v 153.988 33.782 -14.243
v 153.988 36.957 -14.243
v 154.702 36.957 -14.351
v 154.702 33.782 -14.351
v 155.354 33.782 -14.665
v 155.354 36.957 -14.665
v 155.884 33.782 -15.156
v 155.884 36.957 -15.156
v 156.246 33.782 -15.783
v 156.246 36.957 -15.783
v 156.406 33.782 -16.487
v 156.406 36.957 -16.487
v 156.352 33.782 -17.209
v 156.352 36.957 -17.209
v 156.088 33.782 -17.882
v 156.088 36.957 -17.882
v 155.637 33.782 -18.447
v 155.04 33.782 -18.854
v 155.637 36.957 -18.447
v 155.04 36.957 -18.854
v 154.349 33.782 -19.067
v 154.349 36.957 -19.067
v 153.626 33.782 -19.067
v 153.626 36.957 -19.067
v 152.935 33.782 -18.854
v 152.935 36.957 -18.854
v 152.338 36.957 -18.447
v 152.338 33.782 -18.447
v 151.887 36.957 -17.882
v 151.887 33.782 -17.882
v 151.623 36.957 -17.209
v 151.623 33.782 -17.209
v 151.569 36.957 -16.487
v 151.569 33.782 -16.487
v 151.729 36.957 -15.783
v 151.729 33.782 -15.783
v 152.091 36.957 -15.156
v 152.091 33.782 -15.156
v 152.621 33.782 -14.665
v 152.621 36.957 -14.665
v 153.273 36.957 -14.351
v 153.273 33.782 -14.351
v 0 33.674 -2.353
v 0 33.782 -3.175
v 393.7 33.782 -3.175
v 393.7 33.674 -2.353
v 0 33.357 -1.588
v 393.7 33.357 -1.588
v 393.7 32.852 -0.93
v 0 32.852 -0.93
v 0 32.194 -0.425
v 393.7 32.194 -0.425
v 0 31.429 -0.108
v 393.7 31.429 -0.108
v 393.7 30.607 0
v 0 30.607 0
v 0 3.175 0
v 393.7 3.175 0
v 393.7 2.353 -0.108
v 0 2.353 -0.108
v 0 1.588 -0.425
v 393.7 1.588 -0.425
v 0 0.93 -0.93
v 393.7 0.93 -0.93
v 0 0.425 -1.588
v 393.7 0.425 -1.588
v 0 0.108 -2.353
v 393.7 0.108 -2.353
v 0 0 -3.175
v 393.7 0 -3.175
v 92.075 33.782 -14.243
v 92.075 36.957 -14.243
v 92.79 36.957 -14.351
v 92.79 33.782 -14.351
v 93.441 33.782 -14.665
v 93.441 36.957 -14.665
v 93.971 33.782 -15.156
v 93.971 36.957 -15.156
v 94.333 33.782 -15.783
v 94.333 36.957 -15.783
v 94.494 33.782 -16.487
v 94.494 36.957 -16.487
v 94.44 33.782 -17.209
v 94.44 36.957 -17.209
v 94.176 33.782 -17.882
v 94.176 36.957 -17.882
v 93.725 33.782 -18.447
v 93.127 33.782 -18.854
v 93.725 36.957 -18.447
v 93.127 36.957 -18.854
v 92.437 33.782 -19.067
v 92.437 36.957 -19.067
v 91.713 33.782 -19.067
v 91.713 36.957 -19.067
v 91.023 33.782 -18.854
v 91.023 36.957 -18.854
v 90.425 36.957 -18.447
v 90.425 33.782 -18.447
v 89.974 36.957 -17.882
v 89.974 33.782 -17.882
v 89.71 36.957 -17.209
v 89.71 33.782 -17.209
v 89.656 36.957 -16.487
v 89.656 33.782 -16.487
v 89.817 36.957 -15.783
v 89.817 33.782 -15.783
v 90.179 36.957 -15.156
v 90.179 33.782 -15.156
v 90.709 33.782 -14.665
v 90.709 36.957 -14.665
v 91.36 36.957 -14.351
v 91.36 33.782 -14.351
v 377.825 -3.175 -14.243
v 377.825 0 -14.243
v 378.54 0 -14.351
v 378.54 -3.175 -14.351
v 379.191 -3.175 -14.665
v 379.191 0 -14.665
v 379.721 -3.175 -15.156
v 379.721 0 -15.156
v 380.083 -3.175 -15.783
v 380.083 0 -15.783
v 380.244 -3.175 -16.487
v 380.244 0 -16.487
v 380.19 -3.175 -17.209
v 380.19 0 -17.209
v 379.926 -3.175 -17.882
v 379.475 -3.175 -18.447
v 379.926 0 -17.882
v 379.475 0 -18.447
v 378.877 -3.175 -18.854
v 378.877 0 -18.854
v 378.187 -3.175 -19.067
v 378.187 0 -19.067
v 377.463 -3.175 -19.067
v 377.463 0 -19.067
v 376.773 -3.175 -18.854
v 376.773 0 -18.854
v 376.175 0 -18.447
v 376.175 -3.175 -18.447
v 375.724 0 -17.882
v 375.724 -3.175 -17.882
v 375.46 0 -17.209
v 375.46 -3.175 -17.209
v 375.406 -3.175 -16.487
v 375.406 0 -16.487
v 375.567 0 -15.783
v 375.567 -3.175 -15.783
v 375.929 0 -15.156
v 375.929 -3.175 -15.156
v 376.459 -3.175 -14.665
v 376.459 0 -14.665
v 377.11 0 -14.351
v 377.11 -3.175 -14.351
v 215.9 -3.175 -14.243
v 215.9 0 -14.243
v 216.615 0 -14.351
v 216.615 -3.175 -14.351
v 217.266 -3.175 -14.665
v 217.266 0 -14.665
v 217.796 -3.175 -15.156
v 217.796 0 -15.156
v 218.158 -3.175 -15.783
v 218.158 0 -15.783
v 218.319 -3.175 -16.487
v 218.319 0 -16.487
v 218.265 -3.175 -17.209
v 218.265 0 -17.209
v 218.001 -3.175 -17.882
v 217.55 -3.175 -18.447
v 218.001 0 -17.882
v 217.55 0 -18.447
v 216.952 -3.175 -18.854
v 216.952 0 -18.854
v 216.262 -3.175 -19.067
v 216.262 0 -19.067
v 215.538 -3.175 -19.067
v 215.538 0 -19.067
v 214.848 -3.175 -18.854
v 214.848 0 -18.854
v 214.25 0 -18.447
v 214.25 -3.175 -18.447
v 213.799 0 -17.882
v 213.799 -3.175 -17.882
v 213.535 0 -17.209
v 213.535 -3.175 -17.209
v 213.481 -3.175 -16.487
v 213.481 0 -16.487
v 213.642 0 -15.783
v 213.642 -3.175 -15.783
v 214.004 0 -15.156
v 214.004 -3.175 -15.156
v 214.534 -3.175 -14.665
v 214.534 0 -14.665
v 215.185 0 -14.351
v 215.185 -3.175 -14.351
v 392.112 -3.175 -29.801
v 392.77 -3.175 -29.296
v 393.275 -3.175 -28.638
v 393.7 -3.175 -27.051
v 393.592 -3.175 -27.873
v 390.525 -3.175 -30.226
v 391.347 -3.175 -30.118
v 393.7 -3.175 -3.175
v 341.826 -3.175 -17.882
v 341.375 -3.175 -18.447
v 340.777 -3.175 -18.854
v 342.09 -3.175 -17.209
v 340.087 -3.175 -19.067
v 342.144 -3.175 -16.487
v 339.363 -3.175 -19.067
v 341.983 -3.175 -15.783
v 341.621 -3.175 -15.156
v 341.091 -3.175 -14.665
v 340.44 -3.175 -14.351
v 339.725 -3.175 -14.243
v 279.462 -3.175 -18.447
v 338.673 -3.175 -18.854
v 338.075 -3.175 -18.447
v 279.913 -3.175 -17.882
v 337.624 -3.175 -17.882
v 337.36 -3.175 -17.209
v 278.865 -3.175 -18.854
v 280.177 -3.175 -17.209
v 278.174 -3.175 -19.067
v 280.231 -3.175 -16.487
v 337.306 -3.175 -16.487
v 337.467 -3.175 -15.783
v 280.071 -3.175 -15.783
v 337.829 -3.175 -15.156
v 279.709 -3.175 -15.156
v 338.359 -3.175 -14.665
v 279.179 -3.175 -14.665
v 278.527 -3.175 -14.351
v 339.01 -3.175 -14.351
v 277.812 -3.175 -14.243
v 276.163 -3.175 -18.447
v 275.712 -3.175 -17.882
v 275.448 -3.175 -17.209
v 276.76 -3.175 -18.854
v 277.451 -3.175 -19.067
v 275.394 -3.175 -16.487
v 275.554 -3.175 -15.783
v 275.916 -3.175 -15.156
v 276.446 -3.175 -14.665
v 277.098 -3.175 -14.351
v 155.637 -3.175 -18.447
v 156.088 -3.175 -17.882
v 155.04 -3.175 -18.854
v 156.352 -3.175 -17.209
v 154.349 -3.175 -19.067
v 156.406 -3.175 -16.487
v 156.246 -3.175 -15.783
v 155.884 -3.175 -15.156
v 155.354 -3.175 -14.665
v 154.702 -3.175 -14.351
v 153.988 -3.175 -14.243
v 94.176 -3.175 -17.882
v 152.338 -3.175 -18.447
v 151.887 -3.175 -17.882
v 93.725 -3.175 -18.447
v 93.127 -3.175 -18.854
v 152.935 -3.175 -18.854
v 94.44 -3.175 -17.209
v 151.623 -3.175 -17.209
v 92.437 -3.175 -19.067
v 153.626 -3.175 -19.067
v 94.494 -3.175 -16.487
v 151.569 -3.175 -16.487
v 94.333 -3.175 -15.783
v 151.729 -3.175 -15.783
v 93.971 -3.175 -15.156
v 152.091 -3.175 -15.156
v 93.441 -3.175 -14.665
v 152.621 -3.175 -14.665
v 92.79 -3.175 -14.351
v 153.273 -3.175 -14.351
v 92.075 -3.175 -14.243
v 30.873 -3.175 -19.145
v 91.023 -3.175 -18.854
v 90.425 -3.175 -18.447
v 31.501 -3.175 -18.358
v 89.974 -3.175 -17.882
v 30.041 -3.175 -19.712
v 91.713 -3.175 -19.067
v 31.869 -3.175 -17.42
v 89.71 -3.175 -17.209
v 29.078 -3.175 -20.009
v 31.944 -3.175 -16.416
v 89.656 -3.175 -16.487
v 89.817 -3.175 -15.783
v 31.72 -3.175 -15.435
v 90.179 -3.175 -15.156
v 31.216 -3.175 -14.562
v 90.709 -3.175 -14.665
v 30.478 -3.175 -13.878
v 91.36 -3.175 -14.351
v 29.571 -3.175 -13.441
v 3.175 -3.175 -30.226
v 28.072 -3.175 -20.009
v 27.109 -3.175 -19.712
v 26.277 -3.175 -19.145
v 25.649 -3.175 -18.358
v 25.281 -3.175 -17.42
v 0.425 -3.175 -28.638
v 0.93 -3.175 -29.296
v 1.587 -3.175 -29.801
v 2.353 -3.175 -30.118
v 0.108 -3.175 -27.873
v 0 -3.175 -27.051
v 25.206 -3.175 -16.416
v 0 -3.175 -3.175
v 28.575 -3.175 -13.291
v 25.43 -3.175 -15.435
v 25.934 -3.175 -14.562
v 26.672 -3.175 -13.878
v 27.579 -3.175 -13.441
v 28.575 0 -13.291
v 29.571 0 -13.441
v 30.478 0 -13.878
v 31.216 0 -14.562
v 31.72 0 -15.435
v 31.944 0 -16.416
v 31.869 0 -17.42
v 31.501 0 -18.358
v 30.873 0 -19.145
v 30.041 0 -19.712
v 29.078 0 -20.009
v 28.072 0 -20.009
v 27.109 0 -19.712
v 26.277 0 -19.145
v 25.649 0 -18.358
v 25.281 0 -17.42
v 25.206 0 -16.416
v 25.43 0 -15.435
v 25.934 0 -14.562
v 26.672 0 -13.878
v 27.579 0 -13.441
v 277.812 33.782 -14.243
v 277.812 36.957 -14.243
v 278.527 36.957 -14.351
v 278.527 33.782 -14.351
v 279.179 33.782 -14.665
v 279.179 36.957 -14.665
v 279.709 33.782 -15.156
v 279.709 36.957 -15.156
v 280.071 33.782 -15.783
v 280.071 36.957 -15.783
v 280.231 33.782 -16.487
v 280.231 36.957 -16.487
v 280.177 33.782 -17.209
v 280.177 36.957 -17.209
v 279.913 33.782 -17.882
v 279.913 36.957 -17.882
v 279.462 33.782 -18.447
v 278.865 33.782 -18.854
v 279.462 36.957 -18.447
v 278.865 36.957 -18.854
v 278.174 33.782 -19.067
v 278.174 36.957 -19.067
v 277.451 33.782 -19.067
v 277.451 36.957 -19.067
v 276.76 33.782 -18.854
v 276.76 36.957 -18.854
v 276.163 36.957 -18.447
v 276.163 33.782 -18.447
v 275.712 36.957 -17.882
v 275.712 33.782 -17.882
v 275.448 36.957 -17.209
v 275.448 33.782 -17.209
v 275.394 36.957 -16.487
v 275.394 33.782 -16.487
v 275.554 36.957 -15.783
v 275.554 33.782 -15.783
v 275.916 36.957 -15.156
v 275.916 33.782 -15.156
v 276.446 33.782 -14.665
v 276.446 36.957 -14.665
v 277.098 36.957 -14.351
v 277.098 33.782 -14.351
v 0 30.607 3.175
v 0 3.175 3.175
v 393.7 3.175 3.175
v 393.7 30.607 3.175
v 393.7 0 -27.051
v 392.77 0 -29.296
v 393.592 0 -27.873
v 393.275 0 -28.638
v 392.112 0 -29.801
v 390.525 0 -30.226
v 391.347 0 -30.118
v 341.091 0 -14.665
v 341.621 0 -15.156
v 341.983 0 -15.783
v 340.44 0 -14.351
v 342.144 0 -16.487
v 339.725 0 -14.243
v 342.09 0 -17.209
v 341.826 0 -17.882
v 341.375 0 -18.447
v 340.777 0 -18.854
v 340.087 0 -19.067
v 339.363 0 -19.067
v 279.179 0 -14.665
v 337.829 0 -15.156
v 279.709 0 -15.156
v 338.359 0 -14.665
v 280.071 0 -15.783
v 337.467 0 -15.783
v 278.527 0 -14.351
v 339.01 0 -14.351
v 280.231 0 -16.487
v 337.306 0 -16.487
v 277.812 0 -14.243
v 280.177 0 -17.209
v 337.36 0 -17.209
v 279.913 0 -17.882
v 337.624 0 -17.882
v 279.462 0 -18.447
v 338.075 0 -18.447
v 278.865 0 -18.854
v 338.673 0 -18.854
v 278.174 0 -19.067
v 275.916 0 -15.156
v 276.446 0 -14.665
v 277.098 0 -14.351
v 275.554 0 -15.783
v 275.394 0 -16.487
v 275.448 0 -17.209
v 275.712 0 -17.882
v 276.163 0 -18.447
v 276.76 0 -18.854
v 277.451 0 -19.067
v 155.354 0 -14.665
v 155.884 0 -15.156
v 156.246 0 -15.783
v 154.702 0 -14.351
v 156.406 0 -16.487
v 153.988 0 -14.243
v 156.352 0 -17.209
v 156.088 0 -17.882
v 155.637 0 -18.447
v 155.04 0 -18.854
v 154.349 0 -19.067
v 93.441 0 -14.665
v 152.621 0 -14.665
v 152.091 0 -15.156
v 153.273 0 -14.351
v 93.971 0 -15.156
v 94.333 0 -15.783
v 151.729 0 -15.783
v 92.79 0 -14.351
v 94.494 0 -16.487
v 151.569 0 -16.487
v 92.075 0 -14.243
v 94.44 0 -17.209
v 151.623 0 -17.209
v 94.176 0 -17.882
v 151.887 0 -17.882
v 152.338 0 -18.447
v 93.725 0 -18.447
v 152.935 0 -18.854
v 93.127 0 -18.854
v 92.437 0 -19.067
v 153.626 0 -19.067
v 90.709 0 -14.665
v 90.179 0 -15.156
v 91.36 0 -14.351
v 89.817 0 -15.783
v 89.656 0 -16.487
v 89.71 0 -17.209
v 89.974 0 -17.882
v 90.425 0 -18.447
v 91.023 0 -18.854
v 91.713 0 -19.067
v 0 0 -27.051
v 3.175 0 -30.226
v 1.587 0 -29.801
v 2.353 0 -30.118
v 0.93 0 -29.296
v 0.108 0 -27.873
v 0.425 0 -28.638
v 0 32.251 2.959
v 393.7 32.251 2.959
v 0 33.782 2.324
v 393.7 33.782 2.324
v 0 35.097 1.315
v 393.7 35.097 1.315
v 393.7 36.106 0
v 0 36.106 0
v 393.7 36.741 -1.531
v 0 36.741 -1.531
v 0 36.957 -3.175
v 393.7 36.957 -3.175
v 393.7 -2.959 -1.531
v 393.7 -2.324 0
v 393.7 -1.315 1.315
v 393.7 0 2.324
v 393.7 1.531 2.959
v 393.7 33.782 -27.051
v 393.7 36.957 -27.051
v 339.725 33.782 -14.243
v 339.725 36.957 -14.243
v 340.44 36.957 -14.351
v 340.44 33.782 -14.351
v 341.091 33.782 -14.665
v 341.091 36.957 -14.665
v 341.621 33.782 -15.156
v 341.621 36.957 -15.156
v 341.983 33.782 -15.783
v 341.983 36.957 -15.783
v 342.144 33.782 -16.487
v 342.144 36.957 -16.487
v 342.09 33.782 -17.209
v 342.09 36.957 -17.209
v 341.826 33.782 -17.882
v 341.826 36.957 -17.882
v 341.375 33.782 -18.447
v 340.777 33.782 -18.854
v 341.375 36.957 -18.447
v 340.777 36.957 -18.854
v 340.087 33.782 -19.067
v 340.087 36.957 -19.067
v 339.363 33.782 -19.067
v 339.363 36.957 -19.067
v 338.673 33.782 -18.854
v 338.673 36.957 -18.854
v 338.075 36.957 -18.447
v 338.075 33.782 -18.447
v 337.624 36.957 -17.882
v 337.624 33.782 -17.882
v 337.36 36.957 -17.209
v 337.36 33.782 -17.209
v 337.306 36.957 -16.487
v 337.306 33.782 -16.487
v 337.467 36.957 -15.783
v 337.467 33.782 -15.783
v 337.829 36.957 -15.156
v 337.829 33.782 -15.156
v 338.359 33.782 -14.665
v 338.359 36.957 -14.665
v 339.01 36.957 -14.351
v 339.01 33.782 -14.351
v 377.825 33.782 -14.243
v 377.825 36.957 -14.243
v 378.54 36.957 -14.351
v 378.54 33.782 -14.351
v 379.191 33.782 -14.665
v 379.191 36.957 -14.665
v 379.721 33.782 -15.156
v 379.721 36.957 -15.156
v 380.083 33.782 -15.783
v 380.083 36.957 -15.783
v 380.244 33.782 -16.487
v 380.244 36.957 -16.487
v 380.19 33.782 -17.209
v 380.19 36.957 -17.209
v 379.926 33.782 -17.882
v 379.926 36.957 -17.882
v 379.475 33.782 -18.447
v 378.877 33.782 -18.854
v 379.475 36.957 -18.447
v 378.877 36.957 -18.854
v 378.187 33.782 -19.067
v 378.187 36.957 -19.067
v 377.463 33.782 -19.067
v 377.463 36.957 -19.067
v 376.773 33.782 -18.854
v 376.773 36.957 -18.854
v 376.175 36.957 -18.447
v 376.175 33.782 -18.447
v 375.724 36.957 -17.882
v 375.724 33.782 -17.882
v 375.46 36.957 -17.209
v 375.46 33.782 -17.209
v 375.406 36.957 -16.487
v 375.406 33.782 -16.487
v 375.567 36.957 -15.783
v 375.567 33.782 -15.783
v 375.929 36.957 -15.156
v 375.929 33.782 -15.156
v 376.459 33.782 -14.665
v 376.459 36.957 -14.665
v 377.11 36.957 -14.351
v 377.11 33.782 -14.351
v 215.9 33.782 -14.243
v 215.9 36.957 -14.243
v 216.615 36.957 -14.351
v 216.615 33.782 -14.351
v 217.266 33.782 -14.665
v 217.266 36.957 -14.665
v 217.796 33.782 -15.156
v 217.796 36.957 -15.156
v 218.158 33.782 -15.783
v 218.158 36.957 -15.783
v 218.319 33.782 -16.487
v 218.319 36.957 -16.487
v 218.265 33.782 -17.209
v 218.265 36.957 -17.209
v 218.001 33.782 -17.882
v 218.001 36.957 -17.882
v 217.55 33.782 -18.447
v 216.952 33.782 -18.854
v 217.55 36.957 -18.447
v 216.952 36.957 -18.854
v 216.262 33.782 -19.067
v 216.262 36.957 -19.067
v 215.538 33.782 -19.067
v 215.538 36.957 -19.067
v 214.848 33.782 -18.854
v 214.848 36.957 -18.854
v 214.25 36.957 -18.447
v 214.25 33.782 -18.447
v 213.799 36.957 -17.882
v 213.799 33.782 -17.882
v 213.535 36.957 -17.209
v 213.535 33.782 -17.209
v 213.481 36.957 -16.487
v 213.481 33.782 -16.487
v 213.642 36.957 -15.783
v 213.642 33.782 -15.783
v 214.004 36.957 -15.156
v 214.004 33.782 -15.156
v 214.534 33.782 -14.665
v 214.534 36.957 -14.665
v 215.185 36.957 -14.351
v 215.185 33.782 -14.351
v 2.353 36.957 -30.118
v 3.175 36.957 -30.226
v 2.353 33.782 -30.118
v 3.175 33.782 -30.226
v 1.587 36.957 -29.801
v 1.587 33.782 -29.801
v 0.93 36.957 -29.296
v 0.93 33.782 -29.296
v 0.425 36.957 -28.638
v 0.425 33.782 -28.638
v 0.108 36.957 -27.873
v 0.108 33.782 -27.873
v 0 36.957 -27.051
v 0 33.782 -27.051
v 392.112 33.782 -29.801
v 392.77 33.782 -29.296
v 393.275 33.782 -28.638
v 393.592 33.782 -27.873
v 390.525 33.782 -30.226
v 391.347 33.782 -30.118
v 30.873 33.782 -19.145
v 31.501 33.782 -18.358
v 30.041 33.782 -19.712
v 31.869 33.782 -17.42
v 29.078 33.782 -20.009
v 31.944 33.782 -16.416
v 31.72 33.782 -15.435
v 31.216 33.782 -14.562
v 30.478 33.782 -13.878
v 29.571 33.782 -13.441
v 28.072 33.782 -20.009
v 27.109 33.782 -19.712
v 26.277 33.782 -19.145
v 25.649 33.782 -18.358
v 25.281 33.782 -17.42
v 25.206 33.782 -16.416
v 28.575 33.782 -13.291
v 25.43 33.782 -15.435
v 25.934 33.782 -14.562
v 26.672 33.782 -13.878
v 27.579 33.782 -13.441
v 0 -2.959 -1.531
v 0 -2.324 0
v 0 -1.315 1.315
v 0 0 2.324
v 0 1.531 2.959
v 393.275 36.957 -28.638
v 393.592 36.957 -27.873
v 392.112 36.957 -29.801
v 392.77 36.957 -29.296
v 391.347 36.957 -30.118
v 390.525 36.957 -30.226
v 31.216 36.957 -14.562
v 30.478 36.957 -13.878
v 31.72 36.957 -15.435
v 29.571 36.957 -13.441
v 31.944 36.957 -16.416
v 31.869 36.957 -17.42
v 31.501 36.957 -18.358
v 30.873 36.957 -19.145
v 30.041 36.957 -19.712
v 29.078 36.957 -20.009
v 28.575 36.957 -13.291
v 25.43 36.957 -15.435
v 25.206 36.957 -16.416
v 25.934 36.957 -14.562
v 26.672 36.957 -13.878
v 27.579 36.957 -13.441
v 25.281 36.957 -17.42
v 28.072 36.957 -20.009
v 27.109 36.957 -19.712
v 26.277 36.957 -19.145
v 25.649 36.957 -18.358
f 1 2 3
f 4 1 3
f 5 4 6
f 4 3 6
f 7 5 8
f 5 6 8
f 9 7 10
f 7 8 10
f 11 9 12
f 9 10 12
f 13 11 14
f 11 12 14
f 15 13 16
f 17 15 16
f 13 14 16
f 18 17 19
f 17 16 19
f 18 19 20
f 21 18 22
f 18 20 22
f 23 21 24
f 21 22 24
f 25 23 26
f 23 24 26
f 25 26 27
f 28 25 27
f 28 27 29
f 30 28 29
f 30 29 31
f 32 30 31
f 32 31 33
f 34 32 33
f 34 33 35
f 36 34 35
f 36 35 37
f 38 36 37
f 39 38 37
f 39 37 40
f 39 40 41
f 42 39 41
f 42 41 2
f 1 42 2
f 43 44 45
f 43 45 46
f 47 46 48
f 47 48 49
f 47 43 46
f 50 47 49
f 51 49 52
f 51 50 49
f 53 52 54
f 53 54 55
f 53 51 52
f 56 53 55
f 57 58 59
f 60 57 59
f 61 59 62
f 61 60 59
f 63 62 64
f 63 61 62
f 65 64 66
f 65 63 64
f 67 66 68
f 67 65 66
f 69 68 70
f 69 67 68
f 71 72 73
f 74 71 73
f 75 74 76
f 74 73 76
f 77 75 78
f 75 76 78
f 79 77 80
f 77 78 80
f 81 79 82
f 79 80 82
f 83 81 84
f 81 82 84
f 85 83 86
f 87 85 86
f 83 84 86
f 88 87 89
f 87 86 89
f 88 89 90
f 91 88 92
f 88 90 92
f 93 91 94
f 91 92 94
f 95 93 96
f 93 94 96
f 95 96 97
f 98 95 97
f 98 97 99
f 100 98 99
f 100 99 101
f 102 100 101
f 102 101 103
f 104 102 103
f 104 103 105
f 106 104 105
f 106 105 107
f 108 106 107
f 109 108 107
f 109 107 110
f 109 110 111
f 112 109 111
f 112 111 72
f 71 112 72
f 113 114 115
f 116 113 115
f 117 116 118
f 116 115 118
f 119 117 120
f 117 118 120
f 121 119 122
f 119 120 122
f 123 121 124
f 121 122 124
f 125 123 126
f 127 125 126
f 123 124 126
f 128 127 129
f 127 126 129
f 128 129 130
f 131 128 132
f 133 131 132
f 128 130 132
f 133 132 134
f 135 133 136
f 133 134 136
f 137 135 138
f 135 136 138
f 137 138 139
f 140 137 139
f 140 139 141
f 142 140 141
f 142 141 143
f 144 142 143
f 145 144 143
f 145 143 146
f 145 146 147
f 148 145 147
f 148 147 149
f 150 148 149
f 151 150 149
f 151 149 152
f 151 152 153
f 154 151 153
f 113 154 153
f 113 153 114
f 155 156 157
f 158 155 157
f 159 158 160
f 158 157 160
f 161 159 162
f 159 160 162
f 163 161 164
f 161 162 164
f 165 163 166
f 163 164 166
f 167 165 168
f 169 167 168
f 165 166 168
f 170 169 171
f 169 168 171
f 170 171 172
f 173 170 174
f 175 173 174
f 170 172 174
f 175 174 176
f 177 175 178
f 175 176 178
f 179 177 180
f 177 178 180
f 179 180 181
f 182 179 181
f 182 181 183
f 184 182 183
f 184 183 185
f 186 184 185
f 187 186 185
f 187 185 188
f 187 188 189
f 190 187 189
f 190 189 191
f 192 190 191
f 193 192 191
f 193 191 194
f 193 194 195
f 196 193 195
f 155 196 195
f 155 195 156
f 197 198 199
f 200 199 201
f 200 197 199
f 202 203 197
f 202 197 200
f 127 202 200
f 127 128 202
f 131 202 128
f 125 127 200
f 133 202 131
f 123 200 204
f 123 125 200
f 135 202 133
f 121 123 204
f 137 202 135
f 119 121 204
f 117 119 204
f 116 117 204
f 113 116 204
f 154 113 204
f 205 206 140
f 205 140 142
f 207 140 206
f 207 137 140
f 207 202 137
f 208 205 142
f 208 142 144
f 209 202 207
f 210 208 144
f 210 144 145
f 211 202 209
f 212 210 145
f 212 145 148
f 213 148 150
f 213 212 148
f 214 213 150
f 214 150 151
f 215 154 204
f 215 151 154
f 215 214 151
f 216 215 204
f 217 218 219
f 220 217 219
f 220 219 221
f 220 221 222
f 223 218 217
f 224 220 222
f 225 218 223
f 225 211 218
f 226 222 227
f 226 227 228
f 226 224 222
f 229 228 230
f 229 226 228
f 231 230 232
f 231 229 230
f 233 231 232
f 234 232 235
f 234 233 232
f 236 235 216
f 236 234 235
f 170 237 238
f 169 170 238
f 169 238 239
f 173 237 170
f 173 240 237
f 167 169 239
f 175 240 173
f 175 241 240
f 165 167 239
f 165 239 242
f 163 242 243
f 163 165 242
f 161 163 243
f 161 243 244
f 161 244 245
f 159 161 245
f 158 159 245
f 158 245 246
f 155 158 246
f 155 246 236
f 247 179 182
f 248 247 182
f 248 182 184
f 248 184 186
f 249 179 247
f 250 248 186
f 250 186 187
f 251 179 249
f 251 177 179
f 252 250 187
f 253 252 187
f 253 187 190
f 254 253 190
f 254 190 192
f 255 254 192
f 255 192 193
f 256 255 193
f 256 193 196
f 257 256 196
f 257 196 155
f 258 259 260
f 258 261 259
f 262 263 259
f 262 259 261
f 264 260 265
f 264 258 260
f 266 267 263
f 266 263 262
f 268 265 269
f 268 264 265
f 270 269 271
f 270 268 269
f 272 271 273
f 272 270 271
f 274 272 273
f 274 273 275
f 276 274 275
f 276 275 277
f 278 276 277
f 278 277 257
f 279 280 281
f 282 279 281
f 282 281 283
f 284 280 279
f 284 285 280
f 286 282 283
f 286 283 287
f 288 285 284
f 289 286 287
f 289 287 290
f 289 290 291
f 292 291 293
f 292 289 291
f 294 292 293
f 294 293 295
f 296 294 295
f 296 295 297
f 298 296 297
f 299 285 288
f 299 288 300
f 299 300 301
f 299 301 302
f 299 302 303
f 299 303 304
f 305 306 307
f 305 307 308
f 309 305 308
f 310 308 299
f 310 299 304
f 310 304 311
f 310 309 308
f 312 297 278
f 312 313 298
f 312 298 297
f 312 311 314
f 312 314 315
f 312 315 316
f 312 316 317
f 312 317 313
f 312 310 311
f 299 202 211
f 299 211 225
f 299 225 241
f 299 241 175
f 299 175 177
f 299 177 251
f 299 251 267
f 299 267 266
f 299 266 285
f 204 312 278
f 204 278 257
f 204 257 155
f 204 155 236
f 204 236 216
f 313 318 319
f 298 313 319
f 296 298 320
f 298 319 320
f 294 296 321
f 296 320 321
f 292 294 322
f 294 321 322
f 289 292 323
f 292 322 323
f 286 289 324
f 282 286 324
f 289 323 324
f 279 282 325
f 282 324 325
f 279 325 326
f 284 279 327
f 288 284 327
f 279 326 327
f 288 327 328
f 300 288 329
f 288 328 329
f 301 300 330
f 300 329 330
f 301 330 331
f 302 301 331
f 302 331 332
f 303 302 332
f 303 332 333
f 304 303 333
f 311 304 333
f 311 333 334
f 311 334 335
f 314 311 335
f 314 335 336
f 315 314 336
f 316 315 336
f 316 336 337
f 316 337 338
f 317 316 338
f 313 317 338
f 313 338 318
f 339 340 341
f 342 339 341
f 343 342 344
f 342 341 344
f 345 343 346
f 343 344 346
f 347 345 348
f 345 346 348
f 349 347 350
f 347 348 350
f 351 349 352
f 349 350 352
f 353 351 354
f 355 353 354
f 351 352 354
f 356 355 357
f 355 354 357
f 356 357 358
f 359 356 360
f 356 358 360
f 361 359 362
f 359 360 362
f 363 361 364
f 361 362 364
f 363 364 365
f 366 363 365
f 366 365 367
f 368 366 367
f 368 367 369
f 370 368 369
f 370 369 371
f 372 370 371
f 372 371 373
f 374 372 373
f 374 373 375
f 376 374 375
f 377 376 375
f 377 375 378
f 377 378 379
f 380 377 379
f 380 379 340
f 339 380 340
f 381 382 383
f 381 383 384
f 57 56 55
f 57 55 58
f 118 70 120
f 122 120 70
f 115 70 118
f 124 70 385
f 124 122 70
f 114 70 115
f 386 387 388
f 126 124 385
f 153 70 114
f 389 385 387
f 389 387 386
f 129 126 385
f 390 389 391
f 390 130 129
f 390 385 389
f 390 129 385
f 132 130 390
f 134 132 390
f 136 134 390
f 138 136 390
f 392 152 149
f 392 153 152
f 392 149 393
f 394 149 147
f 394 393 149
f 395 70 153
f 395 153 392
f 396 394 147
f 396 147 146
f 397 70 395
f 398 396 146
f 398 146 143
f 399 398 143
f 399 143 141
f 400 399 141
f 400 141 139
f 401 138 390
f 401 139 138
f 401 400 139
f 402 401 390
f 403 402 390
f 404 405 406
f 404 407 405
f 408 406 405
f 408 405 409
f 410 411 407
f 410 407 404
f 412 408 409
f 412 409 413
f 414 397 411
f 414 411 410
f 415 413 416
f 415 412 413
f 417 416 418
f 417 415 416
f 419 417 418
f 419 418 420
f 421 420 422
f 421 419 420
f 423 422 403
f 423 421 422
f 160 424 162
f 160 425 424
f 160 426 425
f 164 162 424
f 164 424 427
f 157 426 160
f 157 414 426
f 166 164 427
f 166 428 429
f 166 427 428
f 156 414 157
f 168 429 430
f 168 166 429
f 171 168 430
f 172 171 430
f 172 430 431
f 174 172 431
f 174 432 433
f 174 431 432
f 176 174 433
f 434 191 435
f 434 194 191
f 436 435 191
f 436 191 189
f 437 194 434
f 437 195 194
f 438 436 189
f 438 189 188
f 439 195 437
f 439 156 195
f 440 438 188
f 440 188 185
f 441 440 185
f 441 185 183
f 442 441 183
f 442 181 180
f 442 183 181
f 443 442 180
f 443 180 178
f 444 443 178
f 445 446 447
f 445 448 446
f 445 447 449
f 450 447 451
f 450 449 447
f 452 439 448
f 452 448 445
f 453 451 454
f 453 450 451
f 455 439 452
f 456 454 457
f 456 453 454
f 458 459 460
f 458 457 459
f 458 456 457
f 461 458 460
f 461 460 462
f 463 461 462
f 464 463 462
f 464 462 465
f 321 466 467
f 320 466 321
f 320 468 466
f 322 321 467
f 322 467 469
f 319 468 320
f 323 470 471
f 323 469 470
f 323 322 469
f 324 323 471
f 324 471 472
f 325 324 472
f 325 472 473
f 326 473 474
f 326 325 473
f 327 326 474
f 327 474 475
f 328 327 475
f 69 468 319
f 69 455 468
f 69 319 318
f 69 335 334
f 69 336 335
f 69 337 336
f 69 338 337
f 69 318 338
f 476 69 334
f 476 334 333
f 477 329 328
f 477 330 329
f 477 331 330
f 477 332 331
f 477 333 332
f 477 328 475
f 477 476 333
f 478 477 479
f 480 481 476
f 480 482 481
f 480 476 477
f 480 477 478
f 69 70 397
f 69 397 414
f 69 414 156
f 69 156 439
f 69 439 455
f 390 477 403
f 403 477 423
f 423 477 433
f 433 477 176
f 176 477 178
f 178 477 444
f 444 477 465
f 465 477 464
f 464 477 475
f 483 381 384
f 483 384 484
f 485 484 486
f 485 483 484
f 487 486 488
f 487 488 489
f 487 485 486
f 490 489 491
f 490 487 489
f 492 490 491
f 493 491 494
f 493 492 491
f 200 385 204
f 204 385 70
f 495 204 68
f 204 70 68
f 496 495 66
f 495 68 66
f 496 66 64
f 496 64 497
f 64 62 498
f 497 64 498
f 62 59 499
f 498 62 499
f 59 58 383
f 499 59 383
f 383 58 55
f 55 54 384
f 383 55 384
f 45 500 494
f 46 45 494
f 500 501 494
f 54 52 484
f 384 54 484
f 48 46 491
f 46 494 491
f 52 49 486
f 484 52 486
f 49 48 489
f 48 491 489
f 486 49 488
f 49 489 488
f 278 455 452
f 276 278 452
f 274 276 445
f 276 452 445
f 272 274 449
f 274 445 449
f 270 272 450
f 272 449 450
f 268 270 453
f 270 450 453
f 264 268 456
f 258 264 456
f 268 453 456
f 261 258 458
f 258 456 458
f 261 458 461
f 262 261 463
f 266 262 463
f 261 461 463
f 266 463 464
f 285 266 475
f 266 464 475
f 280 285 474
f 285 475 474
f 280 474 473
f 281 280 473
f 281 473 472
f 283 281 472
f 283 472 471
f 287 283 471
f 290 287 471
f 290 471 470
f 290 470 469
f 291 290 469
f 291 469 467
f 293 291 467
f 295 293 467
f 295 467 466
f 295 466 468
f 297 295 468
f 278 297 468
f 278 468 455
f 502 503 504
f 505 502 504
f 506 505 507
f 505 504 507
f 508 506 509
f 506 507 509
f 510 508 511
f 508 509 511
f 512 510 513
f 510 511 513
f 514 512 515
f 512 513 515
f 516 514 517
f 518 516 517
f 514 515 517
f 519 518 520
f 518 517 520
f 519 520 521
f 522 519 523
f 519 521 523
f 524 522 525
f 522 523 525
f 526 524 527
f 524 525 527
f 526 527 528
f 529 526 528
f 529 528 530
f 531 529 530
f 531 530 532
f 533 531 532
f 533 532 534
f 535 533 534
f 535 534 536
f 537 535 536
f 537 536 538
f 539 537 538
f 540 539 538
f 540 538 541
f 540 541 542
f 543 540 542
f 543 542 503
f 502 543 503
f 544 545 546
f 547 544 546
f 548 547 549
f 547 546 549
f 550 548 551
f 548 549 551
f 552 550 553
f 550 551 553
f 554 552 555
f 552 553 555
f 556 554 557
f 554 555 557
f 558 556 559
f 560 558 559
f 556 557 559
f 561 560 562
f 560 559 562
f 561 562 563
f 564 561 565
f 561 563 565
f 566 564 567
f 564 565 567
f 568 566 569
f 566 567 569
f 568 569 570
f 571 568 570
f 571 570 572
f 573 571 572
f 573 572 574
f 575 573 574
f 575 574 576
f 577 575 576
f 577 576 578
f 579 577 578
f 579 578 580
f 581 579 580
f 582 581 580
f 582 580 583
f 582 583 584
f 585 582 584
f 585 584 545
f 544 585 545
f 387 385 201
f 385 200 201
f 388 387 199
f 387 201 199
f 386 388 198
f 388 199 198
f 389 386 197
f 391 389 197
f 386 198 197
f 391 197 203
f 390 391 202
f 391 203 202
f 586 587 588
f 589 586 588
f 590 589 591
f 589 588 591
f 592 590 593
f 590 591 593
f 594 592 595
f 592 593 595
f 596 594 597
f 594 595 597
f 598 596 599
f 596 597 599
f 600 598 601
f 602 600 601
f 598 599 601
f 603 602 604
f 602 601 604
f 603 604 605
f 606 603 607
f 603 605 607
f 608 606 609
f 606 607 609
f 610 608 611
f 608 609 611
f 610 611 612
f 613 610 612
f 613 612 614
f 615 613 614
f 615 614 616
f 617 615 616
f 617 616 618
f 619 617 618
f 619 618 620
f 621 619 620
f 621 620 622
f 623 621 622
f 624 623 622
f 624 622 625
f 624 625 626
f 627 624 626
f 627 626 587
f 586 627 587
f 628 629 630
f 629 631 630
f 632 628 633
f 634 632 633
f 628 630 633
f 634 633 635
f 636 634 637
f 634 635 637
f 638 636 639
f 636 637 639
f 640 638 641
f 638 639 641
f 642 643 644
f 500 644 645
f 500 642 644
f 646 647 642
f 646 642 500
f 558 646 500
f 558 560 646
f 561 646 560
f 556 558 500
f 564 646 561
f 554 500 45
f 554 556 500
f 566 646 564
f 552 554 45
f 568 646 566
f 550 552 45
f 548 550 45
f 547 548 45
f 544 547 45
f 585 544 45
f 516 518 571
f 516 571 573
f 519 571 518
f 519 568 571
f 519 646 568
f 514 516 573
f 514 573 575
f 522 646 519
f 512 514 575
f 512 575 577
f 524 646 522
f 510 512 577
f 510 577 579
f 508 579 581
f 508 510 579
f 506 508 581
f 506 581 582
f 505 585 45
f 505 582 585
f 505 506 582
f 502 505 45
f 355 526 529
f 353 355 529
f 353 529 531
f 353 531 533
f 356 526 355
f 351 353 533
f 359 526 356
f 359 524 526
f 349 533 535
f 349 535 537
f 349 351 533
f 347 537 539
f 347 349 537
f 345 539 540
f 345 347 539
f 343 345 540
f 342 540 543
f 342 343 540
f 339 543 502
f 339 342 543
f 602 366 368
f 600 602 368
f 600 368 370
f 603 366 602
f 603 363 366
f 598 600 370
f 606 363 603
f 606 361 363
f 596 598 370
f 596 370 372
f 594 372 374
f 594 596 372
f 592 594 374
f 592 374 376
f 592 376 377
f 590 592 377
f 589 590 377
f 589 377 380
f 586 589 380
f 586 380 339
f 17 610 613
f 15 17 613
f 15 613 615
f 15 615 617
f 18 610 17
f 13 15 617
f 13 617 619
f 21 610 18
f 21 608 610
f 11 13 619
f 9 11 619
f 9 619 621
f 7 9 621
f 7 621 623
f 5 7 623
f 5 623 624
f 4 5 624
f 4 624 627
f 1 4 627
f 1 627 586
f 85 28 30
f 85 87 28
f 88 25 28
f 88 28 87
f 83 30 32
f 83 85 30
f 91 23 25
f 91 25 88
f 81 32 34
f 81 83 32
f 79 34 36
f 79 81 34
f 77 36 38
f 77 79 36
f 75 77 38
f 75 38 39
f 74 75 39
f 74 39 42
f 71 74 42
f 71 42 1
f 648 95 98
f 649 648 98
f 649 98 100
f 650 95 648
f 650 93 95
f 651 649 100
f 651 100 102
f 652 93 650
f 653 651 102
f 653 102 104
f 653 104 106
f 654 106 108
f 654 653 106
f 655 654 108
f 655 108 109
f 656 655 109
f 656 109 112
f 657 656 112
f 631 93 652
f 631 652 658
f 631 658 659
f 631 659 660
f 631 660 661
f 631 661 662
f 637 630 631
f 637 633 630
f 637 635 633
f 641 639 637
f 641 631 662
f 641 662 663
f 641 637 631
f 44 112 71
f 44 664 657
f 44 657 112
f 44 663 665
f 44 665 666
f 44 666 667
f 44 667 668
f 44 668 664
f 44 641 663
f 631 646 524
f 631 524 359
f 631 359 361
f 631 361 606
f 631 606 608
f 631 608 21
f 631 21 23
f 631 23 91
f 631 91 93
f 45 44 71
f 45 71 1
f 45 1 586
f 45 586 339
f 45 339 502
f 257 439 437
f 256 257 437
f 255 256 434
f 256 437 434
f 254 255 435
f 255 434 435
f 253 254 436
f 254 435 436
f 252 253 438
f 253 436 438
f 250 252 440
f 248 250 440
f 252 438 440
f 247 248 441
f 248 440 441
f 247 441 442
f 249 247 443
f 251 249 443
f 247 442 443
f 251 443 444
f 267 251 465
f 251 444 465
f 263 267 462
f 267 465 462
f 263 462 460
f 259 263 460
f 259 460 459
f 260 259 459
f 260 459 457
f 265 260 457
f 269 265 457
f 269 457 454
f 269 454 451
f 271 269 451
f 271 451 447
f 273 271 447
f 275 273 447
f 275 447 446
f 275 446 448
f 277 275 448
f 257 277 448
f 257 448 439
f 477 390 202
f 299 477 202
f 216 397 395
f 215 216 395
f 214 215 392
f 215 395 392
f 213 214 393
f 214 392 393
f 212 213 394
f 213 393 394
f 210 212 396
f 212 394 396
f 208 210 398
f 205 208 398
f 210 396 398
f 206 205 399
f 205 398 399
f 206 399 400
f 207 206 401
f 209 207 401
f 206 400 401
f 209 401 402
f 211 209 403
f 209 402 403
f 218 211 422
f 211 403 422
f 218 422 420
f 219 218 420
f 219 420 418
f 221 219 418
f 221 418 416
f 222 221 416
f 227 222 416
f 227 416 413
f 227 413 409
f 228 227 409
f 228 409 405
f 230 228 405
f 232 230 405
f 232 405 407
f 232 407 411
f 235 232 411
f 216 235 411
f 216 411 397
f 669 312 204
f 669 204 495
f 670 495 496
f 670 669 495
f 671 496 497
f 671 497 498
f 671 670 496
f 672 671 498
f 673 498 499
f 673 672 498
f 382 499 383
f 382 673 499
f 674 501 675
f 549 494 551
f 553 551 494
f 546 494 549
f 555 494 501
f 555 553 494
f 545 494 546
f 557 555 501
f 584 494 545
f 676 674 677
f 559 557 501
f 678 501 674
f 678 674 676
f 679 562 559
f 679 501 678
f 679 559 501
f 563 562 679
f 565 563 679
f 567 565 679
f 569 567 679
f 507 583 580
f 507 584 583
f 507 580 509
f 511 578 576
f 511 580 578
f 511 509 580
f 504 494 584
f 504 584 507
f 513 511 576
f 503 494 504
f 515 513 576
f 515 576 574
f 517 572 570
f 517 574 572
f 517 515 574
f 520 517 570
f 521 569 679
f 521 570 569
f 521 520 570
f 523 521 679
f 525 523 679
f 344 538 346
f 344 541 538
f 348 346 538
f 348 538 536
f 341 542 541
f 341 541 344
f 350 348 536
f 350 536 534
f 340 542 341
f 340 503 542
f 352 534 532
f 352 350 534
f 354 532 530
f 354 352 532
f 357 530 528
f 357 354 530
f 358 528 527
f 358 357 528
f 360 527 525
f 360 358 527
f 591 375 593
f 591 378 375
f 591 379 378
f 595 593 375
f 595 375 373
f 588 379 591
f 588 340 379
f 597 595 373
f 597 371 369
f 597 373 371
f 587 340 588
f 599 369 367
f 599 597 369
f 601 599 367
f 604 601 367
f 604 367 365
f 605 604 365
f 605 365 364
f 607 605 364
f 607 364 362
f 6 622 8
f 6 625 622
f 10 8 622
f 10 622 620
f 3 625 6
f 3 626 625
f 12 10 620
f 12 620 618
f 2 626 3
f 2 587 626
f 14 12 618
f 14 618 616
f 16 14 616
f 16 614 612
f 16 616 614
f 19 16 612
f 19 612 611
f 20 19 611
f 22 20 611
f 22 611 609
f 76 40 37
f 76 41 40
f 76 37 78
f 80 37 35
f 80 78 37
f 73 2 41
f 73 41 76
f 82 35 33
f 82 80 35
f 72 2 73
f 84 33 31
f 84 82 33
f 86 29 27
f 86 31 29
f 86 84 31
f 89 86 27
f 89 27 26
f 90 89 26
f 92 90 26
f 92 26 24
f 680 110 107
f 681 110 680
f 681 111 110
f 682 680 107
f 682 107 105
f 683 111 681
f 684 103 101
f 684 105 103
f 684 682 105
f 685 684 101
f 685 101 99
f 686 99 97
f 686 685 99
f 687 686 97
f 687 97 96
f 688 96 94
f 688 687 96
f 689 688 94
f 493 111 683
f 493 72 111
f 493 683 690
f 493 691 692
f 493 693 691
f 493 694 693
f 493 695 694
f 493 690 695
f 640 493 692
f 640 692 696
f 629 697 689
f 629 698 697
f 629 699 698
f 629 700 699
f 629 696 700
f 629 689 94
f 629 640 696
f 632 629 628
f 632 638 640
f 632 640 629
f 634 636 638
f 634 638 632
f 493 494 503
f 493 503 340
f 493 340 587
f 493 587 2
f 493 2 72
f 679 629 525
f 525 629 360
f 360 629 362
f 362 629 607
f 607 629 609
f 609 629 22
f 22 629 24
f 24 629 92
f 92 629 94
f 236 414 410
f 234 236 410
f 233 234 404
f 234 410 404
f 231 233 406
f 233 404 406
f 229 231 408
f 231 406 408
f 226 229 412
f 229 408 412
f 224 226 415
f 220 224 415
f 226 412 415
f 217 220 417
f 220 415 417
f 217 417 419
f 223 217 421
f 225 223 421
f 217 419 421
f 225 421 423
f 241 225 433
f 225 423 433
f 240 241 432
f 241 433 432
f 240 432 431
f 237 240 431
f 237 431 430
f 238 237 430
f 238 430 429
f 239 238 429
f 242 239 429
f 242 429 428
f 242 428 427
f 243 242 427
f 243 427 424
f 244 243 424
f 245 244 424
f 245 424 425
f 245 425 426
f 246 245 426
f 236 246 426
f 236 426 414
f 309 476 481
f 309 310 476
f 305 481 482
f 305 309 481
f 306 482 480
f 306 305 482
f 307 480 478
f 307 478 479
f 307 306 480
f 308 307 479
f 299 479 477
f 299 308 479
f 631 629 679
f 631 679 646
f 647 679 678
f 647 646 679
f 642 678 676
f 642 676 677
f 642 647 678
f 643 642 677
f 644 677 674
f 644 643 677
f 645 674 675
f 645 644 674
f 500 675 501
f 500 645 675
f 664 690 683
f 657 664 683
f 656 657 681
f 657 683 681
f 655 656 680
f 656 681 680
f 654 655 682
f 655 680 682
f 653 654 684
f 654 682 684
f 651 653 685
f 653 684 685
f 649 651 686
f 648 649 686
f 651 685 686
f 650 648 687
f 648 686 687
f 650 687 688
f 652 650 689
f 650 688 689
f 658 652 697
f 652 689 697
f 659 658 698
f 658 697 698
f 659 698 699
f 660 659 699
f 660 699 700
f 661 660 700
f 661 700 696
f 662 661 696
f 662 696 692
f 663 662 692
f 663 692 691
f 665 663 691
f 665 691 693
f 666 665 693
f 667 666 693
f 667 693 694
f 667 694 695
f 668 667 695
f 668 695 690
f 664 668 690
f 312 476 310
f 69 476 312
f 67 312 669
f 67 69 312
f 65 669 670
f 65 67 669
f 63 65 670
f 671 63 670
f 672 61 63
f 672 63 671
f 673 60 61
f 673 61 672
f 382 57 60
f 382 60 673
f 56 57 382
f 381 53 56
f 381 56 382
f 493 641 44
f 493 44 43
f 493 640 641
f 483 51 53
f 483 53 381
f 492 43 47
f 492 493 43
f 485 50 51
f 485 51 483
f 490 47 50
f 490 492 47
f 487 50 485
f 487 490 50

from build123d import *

# Parameters (mm, degrees)
BASE_FLANGE1_DEPTH = 393.7
SKETCH6_R          = 3.3782
SKETCH6_R_2        = 2.4257
CUT_EXTRUDE1_DEPTH = 397.892779602
FILLET1_R          = 3.175


# Sheet-metal steps are written as plain solids
with BuildPart() as part:
    # Sketch1 → Base-Flange1 (new body)
    with BuildSketch(Plane(origin=(0, 0, 0), x_dir=(0, 0, -1), z_dir=(1, 0, 0))):
        with BuildLine():
            Line((30.226, 33.782), (3.175, 33.782))
            ThreePointArc((3.175, 33.782), (0.92993597, 32.85206403), (0, 30.607))
            Line((0, 30.607), (0, 3.175))
            ThreePointArc((0, 3.175), (0.92993597, 0.92993597), (3.175, 0))
            Line((3.175, 0), (30.226, 0))
            Line((30.226, 0), (30.226, -3.175))
            Line((30.226, -3.175), (3.175, -3.175))
            ThreePointArc((3.175, -3.175), (-1.315128061, -1.315128061), (-3.175, 3.175))
            Line((-3.175, 3.175), (-3.175, 30.607))
            ThreePointArc((-3.175, 30.607), (-1.315128061, 35.097128061), (3.175, 36.957))
            Line((3.175, 36.957), (30.226, 36.957))
            Line((30.226, 36.957), (30.226, 33.782))
        make_face()
    extrude(amount=BASE_FLANGE1_DEPTH)

    # Sketch6 → Cut-Extrude1 (cut, through all)
    with BuildSketch(Plane(origin=(0, 36.957, 0), x_dir=(1, 0, 0), z_dir=(0, 1, 0))):
        with Locations(Location((28.575, 16.66875, 0), (0, 0, 270))):
            Circle(SKETCH6_R)
        with Locations(Location((92.075, 16.66875, 0), (0, 0, 270))):
            Circle(SKETCH6_R_2)
        with Locations(Location((339.725, 16.66875, 0), (0, 0, 270))):
            Circle(SKETCH6_R_2)
        with Locations(Location((377.825, 16.66875, 0), (0, 0, 270))):
            Circle(SKETCH6_R_2)
        with Locations(Location((153.9875, 16.66875, 0), (0, 0, 270))):
            Circle(SKETCH6_R_2)
        with Locations(Location((215.9, 16.66875, 0), (0, 0, 270))):
            Circle(SKETCH6_R_2)
        with Locations(Location((277.8125, 16.66875, 0), (0, 0, 270))):
            Circle(SKETCH6_R_2)
    extrude(amount=-CUT_EXTRUDE1_DEPTH, mode=Mode.SUBTRACT)

    # Fillet1
    fillet1_edges = [part.edges().sort_by_distance(p)[0] for p in [
        (0, -1.5875, -30.226),
        (0, 35.3695, -30.226),
        (393.7, -1.5875, -30.226),
        (393.7, 35.3695, -30.226),
    ]]
    fillet(fillet1_edges, radius=FILLET1_R)


solid = part.part
